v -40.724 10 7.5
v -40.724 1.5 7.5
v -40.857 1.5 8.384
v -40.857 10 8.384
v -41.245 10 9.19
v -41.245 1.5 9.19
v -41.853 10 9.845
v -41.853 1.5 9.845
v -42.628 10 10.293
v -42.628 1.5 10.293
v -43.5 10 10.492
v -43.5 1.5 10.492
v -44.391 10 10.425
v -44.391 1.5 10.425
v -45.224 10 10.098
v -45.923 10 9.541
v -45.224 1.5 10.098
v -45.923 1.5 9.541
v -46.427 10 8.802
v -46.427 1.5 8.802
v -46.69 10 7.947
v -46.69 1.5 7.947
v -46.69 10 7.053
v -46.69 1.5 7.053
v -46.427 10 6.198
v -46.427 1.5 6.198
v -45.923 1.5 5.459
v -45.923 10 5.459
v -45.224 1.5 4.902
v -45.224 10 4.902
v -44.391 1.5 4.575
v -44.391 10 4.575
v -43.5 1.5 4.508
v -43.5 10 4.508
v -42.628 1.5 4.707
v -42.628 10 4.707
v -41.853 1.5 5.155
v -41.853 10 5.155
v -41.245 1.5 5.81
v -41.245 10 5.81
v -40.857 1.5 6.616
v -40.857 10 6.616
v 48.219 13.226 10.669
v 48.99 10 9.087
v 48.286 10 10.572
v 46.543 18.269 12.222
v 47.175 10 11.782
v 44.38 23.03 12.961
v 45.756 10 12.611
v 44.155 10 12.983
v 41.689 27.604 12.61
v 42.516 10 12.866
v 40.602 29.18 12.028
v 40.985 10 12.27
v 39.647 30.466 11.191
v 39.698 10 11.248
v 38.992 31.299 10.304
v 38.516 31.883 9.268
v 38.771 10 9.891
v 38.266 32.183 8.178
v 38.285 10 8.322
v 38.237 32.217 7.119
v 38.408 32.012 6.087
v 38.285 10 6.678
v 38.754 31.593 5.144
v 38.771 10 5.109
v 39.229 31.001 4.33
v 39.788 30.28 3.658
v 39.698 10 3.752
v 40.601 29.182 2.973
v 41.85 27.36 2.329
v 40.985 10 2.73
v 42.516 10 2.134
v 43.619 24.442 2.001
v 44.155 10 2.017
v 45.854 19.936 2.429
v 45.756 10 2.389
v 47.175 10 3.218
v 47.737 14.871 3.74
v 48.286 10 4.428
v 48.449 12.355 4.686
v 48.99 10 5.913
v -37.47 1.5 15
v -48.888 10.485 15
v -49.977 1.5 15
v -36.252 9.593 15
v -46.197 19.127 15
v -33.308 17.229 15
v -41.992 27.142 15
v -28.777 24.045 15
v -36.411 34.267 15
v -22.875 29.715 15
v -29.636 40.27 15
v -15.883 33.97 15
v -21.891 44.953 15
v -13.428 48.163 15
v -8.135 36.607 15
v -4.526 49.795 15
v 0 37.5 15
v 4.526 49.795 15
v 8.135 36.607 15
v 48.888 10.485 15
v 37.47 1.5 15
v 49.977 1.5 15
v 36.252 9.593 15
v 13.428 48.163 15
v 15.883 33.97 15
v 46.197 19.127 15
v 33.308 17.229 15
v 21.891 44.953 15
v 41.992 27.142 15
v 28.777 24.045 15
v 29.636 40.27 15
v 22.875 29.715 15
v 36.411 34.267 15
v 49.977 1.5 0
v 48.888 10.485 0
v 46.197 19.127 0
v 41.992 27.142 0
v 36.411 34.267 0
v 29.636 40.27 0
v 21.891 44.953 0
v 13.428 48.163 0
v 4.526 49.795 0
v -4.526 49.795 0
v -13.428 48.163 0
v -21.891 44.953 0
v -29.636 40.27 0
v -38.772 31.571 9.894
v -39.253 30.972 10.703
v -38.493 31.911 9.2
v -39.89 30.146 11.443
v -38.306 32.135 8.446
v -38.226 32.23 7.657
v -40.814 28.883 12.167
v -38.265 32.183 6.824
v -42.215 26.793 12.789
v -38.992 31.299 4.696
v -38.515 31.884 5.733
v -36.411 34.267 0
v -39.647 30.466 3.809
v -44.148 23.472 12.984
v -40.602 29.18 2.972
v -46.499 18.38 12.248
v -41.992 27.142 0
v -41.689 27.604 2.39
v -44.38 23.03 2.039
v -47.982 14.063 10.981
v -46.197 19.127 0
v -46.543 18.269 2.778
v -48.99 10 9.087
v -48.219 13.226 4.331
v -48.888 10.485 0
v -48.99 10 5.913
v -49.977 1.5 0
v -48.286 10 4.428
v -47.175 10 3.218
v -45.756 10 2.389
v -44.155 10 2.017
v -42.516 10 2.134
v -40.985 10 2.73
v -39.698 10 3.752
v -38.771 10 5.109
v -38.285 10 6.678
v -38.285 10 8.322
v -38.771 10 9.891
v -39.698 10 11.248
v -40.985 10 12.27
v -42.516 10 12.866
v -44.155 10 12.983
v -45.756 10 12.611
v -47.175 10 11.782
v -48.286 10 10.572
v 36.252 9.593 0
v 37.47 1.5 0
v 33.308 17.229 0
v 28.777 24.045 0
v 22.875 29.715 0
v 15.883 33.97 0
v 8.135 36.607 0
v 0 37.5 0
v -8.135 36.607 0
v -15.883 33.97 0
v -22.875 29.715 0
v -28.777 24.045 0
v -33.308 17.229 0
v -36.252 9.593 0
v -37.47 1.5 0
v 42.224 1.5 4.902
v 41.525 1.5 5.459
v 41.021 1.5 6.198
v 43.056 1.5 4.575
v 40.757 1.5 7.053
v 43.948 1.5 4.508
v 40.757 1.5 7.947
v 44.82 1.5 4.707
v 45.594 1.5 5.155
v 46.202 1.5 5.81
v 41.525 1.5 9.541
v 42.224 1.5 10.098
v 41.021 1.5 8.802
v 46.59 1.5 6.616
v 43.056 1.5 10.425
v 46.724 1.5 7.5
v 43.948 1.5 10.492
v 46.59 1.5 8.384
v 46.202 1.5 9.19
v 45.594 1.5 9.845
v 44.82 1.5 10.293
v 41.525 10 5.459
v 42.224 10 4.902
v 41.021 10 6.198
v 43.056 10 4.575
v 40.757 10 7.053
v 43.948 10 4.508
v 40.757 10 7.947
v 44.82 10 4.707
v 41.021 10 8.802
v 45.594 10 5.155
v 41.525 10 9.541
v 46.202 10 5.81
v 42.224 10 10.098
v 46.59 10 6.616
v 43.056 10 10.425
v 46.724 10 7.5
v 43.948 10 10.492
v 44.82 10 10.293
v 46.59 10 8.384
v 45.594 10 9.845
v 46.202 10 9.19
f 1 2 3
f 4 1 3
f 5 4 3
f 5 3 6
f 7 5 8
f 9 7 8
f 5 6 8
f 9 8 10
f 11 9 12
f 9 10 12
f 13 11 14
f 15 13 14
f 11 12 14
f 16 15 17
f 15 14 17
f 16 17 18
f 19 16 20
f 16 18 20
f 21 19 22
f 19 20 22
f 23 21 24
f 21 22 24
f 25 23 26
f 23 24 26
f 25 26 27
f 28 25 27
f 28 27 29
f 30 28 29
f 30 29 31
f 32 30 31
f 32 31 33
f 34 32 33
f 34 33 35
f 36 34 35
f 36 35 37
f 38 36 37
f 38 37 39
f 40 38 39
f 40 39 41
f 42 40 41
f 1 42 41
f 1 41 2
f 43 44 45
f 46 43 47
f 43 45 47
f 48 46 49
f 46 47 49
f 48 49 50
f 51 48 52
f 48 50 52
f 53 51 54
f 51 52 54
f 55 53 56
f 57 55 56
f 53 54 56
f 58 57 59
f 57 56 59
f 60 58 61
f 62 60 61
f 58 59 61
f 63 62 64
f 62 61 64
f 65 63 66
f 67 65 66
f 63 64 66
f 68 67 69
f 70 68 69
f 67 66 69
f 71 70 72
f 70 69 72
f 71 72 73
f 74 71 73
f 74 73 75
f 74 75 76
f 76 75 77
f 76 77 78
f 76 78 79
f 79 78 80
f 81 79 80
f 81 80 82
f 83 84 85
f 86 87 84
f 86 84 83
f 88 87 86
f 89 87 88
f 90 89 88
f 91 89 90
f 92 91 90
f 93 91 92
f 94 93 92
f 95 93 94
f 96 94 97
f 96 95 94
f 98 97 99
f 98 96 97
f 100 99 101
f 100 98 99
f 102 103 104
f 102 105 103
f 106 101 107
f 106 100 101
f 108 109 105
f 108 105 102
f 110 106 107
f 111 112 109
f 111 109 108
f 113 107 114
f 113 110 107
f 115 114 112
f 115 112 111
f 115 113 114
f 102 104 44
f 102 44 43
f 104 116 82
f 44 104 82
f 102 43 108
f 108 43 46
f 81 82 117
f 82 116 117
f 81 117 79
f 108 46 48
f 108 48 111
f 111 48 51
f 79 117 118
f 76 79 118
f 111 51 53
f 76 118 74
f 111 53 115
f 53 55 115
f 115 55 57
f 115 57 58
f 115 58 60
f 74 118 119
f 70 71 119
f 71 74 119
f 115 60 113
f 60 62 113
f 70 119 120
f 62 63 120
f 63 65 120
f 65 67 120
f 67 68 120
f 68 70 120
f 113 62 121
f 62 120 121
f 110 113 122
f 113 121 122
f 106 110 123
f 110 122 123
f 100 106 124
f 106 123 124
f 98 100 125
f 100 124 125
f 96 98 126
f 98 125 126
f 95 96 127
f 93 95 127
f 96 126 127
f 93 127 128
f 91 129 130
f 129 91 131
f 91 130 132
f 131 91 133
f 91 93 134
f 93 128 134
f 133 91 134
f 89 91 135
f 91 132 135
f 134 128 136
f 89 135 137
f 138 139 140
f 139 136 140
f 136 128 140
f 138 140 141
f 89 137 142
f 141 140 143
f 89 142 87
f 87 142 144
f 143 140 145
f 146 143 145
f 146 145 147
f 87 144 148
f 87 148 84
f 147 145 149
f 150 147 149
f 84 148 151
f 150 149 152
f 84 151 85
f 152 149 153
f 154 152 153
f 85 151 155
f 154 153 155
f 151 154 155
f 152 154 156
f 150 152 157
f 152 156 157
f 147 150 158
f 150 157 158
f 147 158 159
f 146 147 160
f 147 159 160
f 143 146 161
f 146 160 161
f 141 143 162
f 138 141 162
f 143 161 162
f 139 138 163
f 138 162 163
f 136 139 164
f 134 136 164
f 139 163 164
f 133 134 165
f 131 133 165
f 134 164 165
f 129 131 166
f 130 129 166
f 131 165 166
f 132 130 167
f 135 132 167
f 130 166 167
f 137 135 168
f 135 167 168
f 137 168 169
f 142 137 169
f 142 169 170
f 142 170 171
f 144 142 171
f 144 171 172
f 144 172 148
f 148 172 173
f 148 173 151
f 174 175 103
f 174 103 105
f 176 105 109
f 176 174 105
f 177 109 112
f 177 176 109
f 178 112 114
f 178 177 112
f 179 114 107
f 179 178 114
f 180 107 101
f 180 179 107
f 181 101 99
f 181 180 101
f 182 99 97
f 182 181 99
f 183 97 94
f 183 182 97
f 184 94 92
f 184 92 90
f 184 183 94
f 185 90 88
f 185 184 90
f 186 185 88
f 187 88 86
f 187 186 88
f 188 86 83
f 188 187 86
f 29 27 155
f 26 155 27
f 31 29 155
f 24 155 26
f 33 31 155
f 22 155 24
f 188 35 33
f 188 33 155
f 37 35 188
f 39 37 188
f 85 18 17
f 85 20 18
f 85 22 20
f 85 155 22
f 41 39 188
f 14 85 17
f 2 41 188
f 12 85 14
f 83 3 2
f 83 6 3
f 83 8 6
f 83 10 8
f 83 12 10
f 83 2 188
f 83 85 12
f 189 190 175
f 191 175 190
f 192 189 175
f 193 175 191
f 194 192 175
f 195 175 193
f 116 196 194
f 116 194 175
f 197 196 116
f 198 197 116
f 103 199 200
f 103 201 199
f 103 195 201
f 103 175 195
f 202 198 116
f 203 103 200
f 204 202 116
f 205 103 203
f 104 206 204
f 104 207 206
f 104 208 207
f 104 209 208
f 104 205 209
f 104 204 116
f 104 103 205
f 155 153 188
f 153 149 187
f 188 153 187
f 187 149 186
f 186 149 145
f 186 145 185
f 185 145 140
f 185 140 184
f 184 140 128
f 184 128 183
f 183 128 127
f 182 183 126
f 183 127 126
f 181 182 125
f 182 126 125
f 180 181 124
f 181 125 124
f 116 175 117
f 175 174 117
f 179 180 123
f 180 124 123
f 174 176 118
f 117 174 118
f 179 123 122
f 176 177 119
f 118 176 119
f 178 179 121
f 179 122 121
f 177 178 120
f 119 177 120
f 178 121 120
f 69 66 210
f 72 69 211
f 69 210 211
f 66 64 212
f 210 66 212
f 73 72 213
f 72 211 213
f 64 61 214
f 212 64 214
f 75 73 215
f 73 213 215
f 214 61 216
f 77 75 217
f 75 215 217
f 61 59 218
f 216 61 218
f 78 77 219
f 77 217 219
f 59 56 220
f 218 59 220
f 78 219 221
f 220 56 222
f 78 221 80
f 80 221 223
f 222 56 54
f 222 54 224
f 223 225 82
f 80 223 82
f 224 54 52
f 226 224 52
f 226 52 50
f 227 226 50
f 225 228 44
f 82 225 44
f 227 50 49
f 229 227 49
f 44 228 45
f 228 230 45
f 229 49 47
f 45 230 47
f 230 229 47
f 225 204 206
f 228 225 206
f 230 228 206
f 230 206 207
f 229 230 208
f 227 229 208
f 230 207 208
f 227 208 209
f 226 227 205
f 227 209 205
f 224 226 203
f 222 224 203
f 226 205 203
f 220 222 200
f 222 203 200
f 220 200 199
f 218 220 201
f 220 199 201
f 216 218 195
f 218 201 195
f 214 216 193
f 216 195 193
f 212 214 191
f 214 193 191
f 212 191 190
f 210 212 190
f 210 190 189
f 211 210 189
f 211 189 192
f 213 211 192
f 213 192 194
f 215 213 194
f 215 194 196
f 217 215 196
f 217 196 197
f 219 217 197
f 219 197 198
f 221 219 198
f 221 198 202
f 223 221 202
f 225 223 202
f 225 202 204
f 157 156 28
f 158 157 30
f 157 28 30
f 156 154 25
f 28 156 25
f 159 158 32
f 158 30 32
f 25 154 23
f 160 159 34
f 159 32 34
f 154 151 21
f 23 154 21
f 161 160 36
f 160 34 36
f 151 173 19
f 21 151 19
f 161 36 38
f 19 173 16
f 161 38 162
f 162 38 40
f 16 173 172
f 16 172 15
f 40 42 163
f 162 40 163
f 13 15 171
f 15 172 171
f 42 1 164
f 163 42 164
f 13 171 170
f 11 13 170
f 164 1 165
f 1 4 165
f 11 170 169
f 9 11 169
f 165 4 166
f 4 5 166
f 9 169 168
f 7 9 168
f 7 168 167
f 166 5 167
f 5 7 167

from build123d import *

# Parameters (mm, degrees)
F0_R     = 50
F0_R_2   = 37.5
F1_DEPTH = 15
F2_W     = 110
F2_H     = 64.89666
F3_DEPTH = 15.001
F4_R     = 3
F5_DEPTH = 50.001
F7_R     = 5.5
F8_DEPTH = 25


with BuildPart() as f1:
    # F0 (on Top) → F1 (new body)
    with BuildSketch(Plane.XY):
        Circle(F0_R)
        Circle(F0_R_2, mode=Mode.SUBTRACT)
    extrude(amount=F1_DEPTH)

    # F2 (on face) → F3 (cut, through all)
    with BuildSketch(Plane.XY.offset(15)):
        with Locations((0, -30.94833)):
            Rectangle(F2_W, F2_H)
    extrude(amount=-F3_DEPTH, mode=Mode.SUBTRACT)

    # F4 (on Front) → F5 (cut, through all)
    with BuildSketch(Plane.XZ):
        with Locations((-43.723741, 7.5)):
            Circle(F4_R)
        with Locations((43.723741, 7.5)):
            Circle(F4_R)
    extrude(amount=-F5_DEPTH, mode=Mode.SUBTRACT)

    # F7 (on offset) → F8 (cut)
    with BuildSketch(Plane.XZ.offset(-10)):
        with Locations((43.723741, 7.5)):
            Circle(F7_R)
        with Locations((-43.723741, 7.5)):
            Circle(F7_R)
    extrude(amount=-F8_DEPTH, mode=Mode.SUBTRACT)


solid = f1.part
